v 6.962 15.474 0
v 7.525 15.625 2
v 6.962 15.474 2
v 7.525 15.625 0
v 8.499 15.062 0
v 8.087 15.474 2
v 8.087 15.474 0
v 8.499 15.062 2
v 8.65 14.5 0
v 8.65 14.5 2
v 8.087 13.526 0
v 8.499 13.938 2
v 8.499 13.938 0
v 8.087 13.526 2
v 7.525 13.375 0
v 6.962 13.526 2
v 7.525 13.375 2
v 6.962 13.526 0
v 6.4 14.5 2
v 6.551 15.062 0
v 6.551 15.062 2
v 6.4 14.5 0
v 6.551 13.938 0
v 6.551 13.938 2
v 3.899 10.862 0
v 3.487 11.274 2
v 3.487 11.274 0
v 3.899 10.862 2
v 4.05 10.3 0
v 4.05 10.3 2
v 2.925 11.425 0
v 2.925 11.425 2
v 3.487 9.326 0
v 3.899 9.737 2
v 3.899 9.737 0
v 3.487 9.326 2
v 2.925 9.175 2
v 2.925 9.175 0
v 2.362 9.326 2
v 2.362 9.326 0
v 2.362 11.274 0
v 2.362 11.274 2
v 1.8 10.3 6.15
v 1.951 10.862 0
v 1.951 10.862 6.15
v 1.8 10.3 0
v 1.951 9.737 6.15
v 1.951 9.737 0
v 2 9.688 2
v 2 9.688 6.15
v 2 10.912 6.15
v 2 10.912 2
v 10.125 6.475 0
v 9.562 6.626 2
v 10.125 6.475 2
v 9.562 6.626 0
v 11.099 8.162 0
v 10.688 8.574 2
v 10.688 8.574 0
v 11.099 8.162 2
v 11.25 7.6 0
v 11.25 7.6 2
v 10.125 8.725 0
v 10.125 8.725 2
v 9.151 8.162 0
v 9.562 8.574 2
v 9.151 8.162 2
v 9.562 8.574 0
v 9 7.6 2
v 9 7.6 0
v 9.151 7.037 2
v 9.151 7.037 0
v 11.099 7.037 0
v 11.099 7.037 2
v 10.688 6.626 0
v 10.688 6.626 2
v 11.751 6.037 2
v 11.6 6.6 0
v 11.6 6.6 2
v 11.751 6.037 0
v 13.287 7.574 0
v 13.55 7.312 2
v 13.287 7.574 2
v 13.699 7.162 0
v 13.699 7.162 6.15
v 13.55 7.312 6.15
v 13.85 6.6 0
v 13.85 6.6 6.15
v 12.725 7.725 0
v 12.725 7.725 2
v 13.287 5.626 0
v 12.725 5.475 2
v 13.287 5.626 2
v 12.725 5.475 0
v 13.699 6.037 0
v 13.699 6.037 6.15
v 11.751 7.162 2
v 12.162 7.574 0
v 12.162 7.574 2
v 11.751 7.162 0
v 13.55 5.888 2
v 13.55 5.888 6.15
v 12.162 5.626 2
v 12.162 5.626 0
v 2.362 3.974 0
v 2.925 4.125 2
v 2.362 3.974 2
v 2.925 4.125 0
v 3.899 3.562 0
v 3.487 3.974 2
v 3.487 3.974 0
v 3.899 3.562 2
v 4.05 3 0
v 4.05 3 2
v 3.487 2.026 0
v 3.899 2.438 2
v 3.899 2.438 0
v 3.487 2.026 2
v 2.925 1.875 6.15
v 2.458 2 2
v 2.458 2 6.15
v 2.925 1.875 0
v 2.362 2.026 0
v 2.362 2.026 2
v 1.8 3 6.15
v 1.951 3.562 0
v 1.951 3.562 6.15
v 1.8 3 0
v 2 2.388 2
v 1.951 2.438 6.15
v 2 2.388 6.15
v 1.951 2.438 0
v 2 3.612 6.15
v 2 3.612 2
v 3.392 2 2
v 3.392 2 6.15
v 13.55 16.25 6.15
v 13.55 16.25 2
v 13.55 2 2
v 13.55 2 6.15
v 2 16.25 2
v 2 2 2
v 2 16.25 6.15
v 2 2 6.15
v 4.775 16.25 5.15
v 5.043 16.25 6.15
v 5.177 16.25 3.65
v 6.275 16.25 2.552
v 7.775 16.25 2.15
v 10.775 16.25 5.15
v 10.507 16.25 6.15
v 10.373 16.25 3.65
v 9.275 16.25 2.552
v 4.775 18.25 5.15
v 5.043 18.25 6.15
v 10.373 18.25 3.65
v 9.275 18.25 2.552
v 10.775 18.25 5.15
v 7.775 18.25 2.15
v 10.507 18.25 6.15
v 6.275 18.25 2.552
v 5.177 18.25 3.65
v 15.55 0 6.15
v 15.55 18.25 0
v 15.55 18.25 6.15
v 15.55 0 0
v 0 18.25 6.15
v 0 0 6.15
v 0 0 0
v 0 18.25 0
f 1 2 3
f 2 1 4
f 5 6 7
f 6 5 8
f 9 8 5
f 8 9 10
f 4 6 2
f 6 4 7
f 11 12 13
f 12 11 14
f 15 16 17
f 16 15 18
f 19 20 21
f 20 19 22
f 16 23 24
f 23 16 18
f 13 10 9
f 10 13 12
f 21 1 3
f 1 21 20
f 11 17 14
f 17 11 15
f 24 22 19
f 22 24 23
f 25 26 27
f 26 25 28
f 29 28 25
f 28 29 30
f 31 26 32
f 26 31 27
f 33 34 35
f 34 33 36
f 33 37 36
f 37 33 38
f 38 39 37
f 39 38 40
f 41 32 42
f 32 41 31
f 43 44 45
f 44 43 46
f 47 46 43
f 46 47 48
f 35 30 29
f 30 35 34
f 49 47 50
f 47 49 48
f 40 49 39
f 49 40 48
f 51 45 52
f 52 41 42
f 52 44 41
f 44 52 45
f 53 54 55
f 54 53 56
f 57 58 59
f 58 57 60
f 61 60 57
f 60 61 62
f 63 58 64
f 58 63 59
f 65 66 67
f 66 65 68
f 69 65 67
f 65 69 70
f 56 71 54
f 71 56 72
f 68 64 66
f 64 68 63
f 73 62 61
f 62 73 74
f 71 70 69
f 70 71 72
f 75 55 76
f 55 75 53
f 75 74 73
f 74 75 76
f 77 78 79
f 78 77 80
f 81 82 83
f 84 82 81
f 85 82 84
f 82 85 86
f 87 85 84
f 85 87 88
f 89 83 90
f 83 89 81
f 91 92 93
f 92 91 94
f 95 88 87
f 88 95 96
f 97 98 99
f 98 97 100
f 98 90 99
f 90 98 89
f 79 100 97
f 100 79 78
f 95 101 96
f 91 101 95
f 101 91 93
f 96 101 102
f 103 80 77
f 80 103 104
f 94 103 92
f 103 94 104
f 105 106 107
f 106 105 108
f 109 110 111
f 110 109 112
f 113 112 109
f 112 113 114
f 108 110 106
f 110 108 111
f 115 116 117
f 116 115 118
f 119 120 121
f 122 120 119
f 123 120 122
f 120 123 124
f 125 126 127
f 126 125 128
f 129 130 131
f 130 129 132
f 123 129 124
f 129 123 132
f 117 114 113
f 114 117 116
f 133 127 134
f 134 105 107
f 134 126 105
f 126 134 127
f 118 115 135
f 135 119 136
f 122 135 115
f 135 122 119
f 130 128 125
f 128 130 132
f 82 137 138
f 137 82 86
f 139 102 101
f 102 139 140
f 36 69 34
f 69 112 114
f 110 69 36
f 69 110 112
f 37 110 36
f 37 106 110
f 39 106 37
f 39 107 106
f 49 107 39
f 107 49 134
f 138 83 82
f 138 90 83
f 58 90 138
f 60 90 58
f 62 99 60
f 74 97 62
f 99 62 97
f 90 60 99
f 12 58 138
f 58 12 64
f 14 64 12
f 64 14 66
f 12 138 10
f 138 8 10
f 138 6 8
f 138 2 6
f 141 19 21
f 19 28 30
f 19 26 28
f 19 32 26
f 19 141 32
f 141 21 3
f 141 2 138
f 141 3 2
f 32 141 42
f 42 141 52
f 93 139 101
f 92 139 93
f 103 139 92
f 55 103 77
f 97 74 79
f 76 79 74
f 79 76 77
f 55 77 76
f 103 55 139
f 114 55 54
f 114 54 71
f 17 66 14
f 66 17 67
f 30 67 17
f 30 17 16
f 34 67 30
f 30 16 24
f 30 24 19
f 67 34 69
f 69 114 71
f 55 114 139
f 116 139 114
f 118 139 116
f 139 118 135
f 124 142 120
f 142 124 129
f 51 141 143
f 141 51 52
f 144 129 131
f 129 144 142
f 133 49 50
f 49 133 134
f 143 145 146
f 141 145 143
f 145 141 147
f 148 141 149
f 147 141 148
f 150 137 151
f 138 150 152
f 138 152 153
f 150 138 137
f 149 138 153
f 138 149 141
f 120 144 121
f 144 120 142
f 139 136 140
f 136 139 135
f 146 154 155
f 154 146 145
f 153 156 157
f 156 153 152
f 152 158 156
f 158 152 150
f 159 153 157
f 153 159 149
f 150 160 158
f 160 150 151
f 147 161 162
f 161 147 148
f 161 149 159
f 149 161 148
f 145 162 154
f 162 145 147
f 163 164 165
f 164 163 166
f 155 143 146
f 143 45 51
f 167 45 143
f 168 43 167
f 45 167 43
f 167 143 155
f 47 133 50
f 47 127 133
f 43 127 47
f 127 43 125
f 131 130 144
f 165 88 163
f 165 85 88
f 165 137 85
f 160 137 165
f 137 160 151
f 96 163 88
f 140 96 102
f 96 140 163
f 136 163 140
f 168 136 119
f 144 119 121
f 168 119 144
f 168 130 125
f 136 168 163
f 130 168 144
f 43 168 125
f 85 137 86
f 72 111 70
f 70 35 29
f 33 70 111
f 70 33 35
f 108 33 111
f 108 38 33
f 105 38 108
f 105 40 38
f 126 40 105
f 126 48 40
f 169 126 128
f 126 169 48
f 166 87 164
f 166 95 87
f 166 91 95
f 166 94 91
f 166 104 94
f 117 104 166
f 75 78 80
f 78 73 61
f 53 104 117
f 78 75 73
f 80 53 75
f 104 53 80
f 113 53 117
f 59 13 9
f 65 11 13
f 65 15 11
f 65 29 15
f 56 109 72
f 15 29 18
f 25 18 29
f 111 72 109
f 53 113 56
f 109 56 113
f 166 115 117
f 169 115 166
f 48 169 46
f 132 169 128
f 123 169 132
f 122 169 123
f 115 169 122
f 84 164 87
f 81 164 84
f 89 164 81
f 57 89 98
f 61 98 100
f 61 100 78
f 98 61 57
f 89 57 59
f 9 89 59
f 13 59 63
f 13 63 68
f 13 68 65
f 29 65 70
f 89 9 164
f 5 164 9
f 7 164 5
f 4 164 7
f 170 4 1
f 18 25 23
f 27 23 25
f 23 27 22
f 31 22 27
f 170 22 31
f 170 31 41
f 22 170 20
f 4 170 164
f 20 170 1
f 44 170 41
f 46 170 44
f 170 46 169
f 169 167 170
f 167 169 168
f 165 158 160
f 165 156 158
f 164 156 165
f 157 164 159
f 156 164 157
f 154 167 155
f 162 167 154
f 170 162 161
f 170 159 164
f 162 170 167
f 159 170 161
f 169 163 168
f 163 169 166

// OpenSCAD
// file: settings.scad
/*
    This file contains the standard options for 
*/

$fn=12;
$wall_thickness = 2;
$wire_diameter = 2.15;
$pj324m_width = 11.55;
$pj324m_length = 14.25;
$pj324m_height = 6.3;
// Unused variables, now defined dynamically as follows:
//$pj324m_socket_width = $pj324m_width + $wall_thickness*2;
//$pj324m_socket_length = $pj324m_length + $wall_thickness*2;
//$pj324m_socket_height = $pj324m_height + $wall_thickness*2;
$pj324m_flange_length = 3.5;
$pj324m_flange_diameter = 6;
$pj324m_pins = [[-.25,12.5],[-4.85,8.3],[2.35,5.6],[4.95,4.6],[-4.85,1]];
$pj324m_plug_width = 10;  // Width of a plug for plate clearance
// main file
include <settings.scad>

/*
    Preview the pj324m socket type.
*/
module pj324m() {
    $pj324m_flange_diameter = 6;
    $pj324m_plug_width = 9;
    difference() {
        pj324m_pcb();
        #pj324m_pcb_cutout();
    }
    %difference(){
        pj324m_case();
        #pj324m_case_cutout();
    }
}

module pj324m_pcb() {
    // Socket Base
    cube([$wall_thickness*2+$pj324m_width,$wall_thickness*2+$pj324m_length,$wall_thickness + ($pj324m_height/2+$pj324m_flange_diameter*1/6)]);
    //not sure if the stuff below is required...
//    translate([
//        $wall_thickness,
//        $wall_thickness-$pj324m_flange_length,
//        $wall_thickness+$pj324m_flange_diameter/2
//    ]) rotate([-90,0,0]) intersection() {
//        cylinder(d=$pj324m_flange_diameter+2,$pj324m_flange_length);
//        translate([0,0,$pj324m_flange_length/2]) 
//            cube([$pj324m_flange_diameter+2,$pj324m_flange_diameter/3,$pj324m_flange_length],center=true);
//    }
}

module pj324m_pcb_cutout() {
    translate([$wall_thickness,$wall_thickness,$wall_thickness]) {
    // Socket Cutout 
        cube([$pj324m_width,$pj324m_length,$pj324m_height]);
        // Flange Cutout
        translate([
            $pj324m_width/2,
            $pj324m_length,
            $pj324m_height/2
        ]) rotate([-90,0,0]) 
            cylinder(d=$pj324m_flange_diameter,h=$pj324m_flange_length+$wall_thickness);
        
        for( pin = $pj324m_pins ){
            translate([pin[0]+$pj324m_width/2,pin[1],-$wall_thickness/2]) 
                wire_channel($wall_thickness*2+$pj324m_height);
        }
    }
}

module pj324m_case() {
    // Unused
}

/*
    The cutout made for the audio jack to plug in with.
*/
module pj324m_case_cutout() {
    translate([
        $pj324m_width/2+$wall_thickness,//h_unit/2,
        $pj324m_length+$wall_thickness*2,
        0//plate_thickness/2-pcb_plate_spacing+trrs_flange_diameter/2-2
    ]) rotate([-90,0,0]) {
        cylinder(h=1000, d=$pj324m_plug_width);
        translate([-$pj324m_plug_width/2,-$pj324m_plug_width,0])
            cube([$pj324m_plug_width, $pj324m_plug_width, 1000]);
    }
}

module wire_channel(length=$wall_thickness) {
    translate([0,0,-$wall_thickness]) cylinder(d=$wire_diameter+.1,h=length);
}

//module trrs_plate_footprint(borders=[0,0,0,0]) {
//    translate([h_unit/2,-v_unit/2,0])
//        border_footprint(
//            [h_unit,v_unit], 
//            borders
//        );
//}
//
//module trrs_plate_cutout_footprint() {
//    if (switch_type == "mx") {
//        // MX spacing is sufficient to fit the TRRS socket with no cutout, so we just need plug clearance
//        translate([h_unit/2,-socket_length/2]) {
//            border_footprint(
//                [socket_width,socket_length], 
//                [
//                    1000,
//                    -socket_length,
//                    (trrs_plug_width-socket_width)/2,
//                    (trrs_plug_width-socket_width)/2
//                ]
//            );
//        }
//    } else if (switch_type == "choc") {
//        translate([h_unit/2,-socket_length/2]) {
//            border_footprint(
//                [socket_width,socket_length], 
//                [1000,0,0,0]
//            );
//            border_footprint(
//                [socket_width,socket_length], 
//                [
//                    1000,
//                    -socket_length,
//                    (trrs_plug_width-socket_width)/2,
//                    (trrs_plug_width-socket_width)/2
//                ]
//            );
//        }
//    } else {
//        assert(false, "switch_type is invalid");
//    }
//}
//
//module trrs_plate_base(borders=[0,0,0,0], thickness=plate_thickness) {
//    linear_extrude(thickness, center=true)
//        trrs_plate_footprint(borders);
//}
//
//module trrs_plate_cutout(thickness=plate_thickness) {
//    linear_extrude(thickness+1, center=true)
//        trrs_plate_cutout_footprint();
//}
//
//module trrs_case_cutout() {
//    translate([
//        h_unit/2,
//        0,
//        plate_thickness/2-pcb_plate_spacing+trrs_flange_diameter/2-2
//    ]) rotate([-90,0,0]) {
//        cylinder(h=1000, d=trrs_plug_width);
//        translate([-trrs_plug_width/2,-trrs_plug_width,0])
//            cube([trrs_plug_width, trrs_plug_width, 1000]);
//    }
//}

pj324m();
